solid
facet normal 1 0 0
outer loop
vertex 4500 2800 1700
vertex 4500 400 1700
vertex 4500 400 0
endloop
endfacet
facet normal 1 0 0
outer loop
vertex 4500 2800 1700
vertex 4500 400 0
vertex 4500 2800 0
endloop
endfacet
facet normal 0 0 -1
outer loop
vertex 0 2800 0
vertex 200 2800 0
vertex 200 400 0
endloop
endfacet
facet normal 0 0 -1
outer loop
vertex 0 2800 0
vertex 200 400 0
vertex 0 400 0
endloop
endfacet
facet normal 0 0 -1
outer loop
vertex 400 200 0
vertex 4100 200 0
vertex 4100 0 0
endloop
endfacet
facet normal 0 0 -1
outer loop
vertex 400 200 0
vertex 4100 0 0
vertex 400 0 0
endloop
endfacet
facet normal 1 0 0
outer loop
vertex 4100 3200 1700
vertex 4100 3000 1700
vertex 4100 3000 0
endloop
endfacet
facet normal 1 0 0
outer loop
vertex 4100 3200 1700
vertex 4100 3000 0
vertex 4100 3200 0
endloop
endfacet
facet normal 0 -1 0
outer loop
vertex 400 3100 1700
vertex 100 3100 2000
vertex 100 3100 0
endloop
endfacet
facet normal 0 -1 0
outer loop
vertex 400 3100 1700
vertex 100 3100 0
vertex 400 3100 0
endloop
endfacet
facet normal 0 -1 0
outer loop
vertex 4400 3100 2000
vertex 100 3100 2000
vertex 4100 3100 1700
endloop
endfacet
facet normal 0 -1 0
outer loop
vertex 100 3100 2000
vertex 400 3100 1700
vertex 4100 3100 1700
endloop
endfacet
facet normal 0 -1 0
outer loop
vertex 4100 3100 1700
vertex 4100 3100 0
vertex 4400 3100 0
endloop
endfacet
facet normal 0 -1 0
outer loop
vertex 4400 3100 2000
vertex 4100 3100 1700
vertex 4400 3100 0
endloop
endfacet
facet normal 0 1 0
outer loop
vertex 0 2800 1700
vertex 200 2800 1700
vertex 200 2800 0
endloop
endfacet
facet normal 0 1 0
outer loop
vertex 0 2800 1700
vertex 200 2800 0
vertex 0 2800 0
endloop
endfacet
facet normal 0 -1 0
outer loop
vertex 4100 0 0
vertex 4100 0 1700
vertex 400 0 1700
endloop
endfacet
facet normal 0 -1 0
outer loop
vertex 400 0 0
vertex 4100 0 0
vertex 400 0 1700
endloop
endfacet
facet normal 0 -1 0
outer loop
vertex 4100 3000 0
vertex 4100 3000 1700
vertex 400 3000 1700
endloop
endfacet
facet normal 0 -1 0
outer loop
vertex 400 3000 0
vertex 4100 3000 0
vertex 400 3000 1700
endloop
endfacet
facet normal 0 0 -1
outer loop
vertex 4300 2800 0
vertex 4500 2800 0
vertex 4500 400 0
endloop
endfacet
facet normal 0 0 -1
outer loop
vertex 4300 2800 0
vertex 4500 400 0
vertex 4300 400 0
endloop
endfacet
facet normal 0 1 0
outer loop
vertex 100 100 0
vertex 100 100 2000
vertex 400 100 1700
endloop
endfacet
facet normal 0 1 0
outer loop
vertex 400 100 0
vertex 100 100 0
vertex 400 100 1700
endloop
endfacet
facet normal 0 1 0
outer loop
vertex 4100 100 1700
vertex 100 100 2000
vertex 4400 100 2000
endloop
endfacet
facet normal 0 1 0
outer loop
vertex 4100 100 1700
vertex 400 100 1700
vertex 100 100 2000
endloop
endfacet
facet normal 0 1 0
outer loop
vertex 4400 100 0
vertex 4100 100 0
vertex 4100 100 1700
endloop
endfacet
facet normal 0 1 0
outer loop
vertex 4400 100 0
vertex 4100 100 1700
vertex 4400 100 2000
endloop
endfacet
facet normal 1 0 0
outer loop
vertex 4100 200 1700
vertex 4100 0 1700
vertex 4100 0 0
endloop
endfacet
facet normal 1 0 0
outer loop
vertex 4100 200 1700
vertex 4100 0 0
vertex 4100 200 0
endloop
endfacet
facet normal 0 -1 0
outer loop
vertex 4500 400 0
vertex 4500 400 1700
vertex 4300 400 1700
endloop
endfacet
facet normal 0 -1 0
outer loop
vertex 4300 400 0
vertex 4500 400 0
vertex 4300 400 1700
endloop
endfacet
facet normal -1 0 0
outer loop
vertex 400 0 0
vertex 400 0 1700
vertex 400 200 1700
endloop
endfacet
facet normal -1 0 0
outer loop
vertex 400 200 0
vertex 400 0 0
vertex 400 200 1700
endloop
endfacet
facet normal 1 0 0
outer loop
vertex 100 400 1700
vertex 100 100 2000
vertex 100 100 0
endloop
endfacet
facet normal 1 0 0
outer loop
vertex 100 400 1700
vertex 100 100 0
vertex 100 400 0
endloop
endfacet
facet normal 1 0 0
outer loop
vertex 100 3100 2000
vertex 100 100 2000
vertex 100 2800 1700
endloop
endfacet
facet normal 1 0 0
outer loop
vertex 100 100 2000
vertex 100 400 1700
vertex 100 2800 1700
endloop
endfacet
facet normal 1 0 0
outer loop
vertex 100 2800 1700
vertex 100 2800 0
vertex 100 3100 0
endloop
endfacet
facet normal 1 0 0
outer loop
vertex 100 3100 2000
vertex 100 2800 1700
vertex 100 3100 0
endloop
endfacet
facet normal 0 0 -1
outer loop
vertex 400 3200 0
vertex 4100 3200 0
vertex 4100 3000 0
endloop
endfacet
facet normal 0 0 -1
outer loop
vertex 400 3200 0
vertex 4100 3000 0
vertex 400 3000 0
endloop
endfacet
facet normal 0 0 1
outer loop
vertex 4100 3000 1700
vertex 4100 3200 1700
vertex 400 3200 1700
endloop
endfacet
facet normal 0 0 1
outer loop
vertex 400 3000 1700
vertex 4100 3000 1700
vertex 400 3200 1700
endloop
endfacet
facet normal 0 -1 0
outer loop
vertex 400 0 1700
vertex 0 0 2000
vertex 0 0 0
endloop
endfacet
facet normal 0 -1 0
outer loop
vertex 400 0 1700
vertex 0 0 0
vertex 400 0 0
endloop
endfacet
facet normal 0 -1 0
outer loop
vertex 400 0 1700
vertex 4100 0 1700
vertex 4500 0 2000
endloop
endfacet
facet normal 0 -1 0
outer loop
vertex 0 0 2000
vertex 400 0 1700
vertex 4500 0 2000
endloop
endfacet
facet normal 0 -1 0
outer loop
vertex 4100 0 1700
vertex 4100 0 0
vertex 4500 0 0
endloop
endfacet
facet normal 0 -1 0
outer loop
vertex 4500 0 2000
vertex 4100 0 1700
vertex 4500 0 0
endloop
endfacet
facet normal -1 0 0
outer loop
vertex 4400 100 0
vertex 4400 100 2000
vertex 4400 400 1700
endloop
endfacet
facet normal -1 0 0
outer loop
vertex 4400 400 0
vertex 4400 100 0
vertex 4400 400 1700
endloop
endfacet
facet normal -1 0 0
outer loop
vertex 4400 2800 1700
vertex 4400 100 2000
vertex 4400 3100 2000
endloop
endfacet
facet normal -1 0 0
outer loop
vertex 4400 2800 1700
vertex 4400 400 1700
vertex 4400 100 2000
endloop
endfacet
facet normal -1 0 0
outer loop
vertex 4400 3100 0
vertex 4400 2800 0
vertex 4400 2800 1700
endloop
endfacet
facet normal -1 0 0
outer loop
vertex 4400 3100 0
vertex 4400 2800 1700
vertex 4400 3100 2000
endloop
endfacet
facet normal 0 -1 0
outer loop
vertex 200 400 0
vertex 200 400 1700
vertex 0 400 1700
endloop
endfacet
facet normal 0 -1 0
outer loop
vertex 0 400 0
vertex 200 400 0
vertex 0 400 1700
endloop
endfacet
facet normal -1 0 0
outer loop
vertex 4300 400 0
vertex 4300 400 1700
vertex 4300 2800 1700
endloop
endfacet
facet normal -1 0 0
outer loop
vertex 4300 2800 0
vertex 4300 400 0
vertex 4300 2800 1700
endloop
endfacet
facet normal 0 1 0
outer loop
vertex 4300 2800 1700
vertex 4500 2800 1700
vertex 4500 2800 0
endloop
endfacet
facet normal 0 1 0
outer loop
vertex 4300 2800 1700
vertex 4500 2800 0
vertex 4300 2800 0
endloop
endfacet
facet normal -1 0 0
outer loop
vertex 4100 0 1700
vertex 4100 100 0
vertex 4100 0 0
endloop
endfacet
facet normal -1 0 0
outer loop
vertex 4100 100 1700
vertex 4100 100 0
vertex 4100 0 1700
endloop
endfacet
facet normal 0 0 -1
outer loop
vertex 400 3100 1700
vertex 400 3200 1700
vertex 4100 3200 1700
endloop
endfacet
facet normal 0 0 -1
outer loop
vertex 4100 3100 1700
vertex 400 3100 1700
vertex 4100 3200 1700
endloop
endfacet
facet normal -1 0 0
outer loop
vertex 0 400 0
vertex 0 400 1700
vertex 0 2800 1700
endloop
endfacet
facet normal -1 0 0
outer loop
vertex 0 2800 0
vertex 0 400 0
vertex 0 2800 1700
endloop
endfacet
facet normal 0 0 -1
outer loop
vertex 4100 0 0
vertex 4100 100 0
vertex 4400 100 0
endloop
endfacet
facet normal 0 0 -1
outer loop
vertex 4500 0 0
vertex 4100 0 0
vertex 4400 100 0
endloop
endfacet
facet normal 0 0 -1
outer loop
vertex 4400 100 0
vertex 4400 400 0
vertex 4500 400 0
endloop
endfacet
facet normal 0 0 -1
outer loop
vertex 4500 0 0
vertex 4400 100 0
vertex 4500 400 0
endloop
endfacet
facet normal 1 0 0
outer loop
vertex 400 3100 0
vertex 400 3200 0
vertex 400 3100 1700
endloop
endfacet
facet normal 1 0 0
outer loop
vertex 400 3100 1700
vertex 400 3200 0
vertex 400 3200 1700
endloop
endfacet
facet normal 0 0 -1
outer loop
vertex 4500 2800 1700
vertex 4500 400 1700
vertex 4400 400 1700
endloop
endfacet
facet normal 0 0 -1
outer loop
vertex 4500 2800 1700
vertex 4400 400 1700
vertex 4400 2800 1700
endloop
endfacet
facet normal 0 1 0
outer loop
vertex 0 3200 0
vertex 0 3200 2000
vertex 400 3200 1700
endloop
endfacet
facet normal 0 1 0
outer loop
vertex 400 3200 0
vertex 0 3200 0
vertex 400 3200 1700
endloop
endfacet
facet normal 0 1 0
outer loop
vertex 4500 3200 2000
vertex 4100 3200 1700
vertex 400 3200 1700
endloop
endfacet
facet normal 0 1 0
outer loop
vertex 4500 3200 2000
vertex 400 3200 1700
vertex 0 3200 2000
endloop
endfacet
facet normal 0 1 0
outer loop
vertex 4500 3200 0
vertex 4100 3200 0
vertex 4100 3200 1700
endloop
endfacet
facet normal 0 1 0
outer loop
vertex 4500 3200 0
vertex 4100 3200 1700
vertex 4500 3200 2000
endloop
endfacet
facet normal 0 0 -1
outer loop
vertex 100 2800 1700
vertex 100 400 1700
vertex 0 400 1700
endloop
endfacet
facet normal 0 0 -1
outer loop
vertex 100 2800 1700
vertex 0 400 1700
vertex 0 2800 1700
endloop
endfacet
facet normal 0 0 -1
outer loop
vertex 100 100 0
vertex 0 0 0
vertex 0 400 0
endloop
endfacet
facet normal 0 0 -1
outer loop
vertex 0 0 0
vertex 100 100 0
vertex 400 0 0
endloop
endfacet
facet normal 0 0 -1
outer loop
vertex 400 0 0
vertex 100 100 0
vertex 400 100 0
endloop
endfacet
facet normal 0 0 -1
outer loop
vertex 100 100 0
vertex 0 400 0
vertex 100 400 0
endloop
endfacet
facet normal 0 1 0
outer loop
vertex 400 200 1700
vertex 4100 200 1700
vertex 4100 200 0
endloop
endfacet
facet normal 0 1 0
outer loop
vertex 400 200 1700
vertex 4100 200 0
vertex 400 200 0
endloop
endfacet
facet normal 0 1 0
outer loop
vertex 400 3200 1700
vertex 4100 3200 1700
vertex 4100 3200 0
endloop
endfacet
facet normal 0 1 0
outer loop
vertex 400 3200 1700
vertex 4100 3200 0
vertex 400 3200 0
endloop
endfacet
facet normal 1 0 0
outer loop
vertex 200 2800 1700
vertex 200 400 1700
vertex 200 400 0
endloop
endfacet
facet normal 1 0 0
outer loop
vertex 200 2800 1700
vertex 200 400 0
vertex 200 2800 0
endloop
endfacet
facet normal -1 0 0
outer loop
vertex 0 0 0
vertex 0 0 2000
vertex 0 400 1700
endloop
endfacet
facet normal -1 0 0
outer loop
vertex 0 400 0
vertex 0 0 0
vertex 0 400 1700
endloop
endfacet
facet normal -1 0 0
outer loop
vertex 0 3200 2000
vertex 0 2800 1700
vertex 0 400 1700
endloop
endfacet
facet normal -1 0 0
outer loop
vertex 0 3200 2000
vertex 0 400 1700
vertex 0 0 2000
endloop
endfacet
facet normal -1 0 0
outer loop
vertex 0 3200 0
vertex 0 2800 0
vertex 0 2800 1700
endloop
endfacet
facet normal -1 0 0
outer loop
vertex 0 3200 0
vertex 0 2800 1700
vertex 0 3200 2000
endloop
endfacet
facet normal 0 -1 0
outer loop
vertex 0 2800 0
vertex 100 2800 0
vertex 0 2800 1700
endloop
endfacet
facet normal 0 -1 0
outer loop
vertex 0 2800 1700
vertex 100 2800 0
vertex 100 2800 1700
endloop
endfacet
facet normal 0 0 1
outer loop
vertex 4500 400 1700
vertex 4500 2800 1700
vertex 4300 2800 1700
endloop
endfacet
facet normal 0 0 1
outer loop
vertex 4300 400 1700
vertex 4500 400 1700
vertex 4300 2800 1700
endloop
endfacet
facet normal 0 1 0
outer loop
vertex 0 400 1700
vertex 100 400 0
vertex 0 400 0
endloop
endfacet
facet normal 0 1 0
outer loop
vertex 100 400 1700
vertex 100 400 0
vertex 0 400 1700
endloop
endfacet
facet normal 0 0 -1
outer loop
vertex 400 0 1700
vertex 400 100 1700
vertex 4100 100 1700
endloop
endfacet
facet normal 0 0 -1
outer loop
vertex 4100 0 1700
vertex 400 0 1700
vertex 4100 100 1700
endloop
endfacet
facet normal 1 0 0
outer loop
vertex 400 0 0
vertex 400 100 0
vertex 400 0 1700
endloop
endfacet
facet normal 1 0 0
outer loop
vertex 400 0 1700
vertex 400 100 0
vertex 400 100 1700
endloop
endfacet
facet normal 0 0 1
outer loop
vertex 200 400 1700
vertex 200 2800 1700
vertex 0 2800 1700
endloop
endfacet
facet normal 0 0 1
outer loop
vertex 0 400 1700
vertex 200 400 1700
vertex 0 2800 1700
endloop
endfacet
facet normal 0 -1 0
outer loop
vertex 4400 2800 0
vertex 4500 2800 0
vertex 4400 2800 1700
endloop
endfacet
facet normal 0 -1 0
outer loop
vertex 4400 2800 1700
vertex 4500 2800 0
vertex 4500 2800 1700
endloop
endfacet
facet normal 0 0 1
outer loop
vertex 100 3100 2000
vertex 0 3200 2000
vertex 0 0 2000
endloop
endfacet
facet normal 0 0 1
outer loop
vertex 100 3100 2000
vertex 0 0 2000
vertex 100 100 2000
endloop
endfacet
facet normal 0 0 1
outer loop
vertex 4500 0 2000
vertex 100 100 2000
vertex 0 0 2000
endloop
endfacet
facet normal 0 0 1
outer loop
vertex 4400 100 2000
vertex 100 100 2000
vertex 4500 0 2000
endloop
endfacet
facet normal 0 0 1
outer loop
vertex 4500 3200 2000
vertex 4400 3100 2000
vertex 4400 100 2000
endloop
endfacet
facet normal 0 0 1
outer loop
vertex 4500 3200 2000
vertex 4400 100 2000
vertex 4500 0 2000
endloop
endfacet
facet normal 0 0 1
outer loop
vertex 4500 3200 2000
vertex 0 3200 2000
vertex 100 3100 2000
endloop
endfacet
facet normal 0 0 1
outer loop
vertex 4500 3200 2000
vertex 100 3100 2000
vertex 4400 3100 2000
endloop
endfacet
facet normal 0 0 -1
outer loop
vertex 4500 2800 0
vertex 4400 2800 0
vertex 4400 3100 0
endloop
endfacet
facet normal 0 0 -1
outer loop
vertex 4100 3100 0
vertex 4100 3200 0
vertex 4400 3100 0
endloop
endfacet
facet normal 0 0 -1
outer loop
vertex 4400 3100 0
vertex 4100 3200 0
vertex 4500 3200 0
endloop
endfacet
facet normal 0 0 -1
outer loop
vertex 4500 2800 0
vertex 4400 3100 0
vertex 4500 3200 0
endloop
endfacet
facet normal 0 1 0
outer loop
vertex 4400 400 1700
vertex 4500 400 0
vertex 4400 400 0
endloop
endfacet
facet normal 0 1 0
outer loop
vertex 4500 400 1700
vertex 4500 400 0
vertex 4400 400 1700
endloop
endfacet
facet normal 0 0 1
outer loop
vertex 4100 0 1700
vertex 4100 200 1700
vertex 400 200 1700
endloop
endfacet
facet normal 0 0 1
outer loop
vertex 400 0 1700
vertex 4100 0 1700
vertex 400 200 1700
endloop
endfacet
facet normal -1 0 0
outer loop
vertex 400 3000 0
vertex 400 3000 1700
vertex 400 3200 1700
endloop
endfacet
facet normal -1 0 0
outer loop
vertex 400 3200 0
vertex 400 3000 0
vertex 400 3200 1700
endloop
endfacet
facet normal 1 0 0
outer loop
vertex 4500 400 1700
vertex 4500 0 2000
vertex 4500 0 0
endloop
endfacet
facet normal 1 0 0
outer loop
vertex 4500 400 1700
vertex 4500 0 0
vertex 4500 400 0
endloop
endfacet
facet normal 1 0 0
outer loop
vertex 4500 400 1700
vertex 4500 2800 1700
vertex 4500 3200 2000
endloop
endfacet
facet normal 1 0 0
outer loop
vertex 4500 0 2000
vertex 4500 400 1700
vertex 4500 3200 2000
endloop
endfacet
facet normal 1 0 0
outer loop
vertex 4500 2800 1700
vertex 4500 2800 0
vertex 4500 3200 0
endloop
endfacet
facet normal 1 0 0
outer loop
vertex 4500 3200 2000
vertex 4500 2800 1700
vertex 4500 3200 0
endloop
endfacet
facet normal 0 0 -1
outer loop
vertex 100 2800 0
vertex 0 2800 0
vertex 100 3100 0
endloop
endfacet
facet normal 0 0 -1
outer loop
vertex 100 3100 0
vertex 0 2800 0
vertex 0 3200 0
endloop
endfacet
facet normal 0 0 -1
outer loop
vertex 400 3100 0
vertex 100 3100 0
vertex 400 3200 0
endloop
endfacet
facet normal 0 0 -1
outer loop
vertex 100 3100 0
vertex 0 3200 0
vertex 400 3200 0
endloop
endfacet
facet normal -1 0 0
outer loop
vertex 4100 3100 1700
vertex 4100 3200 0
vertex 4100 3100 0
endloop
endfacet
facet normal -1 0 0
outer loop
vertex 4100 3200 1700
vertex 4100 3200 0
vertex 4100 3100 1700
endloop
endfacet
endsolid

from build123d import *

# Parameters (mm, degrees)
SKETCH1_W               = 4500
SKETCH1_H               = 3200
SKETCH1_W_2             = 4300
SKETCH1_H_2             = 3000
BOSS_EXTRUDE1_DEPTH     = 2000
CUT_EXTRUDE1_DEPTH      = 5819.93461039
CUT_EXTRUDE1_DEPTH_BACK = 5819.93461039
SKETCH2_W               = 3700
SKETCH2_H               = 1700
CUT_EXTRUDE2_DEPTH      = 5873.81874401
CUT_EXTRUDE2_DEPTH_BACK = 5873.81874401
SKETCH3_W               = 1700
SKETCH3_H               = 2400
SKETCH4_W               = 3700
SKETCH4_H               = 200
BOSS_EXTRUDE2_DEPTH     = 1700
SKETCH4_W_2             = 200
SKETCH4_H_2             = 2400
BOSS_EXTRUDE2_2_DEPTH   = 1700
BOSS_EXTRUDE2_3_DEPTH   = 1700
BOSS_EXTRUDE2_4_DEPTH   = 1700


with BuildPart() as part:
    # Sketch1 → Boss-Extrude1 (new body)
    with BuildSketch(Plane.XY):
        with Locations((2250, 1600)):
            Rectangle(SKETCH1_W, SKETCH1_H)
        with Locations((2250, 1600)):
            Rectangle(SKETCH1_W_2, SKETCH1_H_2, mode=Mode.SUBTRACT)
    extrude(amount=BOSS_EXTRUDE1_DEPTH)

    # Sketch2 → Cut-Extrude1 (cut, two sides: drawn at the far end of the back side and taken through both)
    with BuildSketch(Plane.XZ.offset(-3100).offset(-CUT_EXTRUDE1_DEPTH_BACK)):
        with Locations((2250, 850)):
            Rectangle(SKETCH2_W, SKETCH2_H)
    extrude(amount=CUT_EXTRUDE1_DEPTH + CUT_EXTRUDE1_DEPTH_BACK, mode=Mode.SUBTRACT)

    # Sketch3 → Cut-Extrude2 (cut, two sides: drawn at the far end of the back side and taken through both)
    with BuildSketch(Plane.ZY.offset(-CUT_EXTRUDE2_DEPTH_BACK)):
        with Locations((850, 1600)):
            Rectangle(SKETCH3_W, SKETCH3_H)
    extrude(amount=CUT_EXTRUDE2_DEPTH + CUT_EXTRUDE2_DEPTH_BACK, mode=Mode.SUBTRACT)


with BuildPart() as body_2:
    # Sketch4 → Boss-Extrude2 (new body)
    with BuildSketch(Plane(origin=(0, 0, 1700), x_dir=(-1, 0, 0), z_dir=(0, 0, -1))):
        with Locations((-2250, 100)):
            Rectangle(SKETCH4_W, SKETCH4_H)
    extrude(amount=BOSS_EXTRUDE2_DEPTH)


with BuildPart() as body_3:
    # Sketch4 → Boss-Extrude2 2 (new body)
    with BuildSketch(Plane(origin=(0, 0, 1700), x_dir=(-1, 0, 0), z_dir=(0, 0, -1))):
        with Locations((-100, 1600)):
            Rectangle(SKETCH4_W_2, SKETCH4_H_2)
    extrude(amount=BOSS_EXTRUDE2_2_DEPTH)


with BuildPart() as body_4:
    # Sketch4 → Boss-Extrude2 3 (new body)
    with BuildSketch(Plane(origin=(0, 0, 1700), x_dir=(-1, 0, 0), z_dir=(0, 0, -1))):
        with Locations((-2250, 3100)):
            Rectangle(SKETCH4_W, SKETCH4_H)
    extrude(amount=BOSS_EXTRUDE2_3_DEPTH)


with BuildPart() as body_5:
    # Sketch4 → Boss-Extrude2 4 (new body)
    with BuildSketch(Plane(origin=(0, 0, 1700), x_dir=(-1, 0, 0), z_dir=(0, 0, -1))):
        with Locations((-4400, 1600)):
            Rectangle(SKETCH4_W_2, SKETCH4_H_2)
    extrude(amount=BOSS_EXTRUDE2_4_DEPTH)


solid = Compound([part.part, body_2.part, body_3.part, body_4.part, body_5.part])
